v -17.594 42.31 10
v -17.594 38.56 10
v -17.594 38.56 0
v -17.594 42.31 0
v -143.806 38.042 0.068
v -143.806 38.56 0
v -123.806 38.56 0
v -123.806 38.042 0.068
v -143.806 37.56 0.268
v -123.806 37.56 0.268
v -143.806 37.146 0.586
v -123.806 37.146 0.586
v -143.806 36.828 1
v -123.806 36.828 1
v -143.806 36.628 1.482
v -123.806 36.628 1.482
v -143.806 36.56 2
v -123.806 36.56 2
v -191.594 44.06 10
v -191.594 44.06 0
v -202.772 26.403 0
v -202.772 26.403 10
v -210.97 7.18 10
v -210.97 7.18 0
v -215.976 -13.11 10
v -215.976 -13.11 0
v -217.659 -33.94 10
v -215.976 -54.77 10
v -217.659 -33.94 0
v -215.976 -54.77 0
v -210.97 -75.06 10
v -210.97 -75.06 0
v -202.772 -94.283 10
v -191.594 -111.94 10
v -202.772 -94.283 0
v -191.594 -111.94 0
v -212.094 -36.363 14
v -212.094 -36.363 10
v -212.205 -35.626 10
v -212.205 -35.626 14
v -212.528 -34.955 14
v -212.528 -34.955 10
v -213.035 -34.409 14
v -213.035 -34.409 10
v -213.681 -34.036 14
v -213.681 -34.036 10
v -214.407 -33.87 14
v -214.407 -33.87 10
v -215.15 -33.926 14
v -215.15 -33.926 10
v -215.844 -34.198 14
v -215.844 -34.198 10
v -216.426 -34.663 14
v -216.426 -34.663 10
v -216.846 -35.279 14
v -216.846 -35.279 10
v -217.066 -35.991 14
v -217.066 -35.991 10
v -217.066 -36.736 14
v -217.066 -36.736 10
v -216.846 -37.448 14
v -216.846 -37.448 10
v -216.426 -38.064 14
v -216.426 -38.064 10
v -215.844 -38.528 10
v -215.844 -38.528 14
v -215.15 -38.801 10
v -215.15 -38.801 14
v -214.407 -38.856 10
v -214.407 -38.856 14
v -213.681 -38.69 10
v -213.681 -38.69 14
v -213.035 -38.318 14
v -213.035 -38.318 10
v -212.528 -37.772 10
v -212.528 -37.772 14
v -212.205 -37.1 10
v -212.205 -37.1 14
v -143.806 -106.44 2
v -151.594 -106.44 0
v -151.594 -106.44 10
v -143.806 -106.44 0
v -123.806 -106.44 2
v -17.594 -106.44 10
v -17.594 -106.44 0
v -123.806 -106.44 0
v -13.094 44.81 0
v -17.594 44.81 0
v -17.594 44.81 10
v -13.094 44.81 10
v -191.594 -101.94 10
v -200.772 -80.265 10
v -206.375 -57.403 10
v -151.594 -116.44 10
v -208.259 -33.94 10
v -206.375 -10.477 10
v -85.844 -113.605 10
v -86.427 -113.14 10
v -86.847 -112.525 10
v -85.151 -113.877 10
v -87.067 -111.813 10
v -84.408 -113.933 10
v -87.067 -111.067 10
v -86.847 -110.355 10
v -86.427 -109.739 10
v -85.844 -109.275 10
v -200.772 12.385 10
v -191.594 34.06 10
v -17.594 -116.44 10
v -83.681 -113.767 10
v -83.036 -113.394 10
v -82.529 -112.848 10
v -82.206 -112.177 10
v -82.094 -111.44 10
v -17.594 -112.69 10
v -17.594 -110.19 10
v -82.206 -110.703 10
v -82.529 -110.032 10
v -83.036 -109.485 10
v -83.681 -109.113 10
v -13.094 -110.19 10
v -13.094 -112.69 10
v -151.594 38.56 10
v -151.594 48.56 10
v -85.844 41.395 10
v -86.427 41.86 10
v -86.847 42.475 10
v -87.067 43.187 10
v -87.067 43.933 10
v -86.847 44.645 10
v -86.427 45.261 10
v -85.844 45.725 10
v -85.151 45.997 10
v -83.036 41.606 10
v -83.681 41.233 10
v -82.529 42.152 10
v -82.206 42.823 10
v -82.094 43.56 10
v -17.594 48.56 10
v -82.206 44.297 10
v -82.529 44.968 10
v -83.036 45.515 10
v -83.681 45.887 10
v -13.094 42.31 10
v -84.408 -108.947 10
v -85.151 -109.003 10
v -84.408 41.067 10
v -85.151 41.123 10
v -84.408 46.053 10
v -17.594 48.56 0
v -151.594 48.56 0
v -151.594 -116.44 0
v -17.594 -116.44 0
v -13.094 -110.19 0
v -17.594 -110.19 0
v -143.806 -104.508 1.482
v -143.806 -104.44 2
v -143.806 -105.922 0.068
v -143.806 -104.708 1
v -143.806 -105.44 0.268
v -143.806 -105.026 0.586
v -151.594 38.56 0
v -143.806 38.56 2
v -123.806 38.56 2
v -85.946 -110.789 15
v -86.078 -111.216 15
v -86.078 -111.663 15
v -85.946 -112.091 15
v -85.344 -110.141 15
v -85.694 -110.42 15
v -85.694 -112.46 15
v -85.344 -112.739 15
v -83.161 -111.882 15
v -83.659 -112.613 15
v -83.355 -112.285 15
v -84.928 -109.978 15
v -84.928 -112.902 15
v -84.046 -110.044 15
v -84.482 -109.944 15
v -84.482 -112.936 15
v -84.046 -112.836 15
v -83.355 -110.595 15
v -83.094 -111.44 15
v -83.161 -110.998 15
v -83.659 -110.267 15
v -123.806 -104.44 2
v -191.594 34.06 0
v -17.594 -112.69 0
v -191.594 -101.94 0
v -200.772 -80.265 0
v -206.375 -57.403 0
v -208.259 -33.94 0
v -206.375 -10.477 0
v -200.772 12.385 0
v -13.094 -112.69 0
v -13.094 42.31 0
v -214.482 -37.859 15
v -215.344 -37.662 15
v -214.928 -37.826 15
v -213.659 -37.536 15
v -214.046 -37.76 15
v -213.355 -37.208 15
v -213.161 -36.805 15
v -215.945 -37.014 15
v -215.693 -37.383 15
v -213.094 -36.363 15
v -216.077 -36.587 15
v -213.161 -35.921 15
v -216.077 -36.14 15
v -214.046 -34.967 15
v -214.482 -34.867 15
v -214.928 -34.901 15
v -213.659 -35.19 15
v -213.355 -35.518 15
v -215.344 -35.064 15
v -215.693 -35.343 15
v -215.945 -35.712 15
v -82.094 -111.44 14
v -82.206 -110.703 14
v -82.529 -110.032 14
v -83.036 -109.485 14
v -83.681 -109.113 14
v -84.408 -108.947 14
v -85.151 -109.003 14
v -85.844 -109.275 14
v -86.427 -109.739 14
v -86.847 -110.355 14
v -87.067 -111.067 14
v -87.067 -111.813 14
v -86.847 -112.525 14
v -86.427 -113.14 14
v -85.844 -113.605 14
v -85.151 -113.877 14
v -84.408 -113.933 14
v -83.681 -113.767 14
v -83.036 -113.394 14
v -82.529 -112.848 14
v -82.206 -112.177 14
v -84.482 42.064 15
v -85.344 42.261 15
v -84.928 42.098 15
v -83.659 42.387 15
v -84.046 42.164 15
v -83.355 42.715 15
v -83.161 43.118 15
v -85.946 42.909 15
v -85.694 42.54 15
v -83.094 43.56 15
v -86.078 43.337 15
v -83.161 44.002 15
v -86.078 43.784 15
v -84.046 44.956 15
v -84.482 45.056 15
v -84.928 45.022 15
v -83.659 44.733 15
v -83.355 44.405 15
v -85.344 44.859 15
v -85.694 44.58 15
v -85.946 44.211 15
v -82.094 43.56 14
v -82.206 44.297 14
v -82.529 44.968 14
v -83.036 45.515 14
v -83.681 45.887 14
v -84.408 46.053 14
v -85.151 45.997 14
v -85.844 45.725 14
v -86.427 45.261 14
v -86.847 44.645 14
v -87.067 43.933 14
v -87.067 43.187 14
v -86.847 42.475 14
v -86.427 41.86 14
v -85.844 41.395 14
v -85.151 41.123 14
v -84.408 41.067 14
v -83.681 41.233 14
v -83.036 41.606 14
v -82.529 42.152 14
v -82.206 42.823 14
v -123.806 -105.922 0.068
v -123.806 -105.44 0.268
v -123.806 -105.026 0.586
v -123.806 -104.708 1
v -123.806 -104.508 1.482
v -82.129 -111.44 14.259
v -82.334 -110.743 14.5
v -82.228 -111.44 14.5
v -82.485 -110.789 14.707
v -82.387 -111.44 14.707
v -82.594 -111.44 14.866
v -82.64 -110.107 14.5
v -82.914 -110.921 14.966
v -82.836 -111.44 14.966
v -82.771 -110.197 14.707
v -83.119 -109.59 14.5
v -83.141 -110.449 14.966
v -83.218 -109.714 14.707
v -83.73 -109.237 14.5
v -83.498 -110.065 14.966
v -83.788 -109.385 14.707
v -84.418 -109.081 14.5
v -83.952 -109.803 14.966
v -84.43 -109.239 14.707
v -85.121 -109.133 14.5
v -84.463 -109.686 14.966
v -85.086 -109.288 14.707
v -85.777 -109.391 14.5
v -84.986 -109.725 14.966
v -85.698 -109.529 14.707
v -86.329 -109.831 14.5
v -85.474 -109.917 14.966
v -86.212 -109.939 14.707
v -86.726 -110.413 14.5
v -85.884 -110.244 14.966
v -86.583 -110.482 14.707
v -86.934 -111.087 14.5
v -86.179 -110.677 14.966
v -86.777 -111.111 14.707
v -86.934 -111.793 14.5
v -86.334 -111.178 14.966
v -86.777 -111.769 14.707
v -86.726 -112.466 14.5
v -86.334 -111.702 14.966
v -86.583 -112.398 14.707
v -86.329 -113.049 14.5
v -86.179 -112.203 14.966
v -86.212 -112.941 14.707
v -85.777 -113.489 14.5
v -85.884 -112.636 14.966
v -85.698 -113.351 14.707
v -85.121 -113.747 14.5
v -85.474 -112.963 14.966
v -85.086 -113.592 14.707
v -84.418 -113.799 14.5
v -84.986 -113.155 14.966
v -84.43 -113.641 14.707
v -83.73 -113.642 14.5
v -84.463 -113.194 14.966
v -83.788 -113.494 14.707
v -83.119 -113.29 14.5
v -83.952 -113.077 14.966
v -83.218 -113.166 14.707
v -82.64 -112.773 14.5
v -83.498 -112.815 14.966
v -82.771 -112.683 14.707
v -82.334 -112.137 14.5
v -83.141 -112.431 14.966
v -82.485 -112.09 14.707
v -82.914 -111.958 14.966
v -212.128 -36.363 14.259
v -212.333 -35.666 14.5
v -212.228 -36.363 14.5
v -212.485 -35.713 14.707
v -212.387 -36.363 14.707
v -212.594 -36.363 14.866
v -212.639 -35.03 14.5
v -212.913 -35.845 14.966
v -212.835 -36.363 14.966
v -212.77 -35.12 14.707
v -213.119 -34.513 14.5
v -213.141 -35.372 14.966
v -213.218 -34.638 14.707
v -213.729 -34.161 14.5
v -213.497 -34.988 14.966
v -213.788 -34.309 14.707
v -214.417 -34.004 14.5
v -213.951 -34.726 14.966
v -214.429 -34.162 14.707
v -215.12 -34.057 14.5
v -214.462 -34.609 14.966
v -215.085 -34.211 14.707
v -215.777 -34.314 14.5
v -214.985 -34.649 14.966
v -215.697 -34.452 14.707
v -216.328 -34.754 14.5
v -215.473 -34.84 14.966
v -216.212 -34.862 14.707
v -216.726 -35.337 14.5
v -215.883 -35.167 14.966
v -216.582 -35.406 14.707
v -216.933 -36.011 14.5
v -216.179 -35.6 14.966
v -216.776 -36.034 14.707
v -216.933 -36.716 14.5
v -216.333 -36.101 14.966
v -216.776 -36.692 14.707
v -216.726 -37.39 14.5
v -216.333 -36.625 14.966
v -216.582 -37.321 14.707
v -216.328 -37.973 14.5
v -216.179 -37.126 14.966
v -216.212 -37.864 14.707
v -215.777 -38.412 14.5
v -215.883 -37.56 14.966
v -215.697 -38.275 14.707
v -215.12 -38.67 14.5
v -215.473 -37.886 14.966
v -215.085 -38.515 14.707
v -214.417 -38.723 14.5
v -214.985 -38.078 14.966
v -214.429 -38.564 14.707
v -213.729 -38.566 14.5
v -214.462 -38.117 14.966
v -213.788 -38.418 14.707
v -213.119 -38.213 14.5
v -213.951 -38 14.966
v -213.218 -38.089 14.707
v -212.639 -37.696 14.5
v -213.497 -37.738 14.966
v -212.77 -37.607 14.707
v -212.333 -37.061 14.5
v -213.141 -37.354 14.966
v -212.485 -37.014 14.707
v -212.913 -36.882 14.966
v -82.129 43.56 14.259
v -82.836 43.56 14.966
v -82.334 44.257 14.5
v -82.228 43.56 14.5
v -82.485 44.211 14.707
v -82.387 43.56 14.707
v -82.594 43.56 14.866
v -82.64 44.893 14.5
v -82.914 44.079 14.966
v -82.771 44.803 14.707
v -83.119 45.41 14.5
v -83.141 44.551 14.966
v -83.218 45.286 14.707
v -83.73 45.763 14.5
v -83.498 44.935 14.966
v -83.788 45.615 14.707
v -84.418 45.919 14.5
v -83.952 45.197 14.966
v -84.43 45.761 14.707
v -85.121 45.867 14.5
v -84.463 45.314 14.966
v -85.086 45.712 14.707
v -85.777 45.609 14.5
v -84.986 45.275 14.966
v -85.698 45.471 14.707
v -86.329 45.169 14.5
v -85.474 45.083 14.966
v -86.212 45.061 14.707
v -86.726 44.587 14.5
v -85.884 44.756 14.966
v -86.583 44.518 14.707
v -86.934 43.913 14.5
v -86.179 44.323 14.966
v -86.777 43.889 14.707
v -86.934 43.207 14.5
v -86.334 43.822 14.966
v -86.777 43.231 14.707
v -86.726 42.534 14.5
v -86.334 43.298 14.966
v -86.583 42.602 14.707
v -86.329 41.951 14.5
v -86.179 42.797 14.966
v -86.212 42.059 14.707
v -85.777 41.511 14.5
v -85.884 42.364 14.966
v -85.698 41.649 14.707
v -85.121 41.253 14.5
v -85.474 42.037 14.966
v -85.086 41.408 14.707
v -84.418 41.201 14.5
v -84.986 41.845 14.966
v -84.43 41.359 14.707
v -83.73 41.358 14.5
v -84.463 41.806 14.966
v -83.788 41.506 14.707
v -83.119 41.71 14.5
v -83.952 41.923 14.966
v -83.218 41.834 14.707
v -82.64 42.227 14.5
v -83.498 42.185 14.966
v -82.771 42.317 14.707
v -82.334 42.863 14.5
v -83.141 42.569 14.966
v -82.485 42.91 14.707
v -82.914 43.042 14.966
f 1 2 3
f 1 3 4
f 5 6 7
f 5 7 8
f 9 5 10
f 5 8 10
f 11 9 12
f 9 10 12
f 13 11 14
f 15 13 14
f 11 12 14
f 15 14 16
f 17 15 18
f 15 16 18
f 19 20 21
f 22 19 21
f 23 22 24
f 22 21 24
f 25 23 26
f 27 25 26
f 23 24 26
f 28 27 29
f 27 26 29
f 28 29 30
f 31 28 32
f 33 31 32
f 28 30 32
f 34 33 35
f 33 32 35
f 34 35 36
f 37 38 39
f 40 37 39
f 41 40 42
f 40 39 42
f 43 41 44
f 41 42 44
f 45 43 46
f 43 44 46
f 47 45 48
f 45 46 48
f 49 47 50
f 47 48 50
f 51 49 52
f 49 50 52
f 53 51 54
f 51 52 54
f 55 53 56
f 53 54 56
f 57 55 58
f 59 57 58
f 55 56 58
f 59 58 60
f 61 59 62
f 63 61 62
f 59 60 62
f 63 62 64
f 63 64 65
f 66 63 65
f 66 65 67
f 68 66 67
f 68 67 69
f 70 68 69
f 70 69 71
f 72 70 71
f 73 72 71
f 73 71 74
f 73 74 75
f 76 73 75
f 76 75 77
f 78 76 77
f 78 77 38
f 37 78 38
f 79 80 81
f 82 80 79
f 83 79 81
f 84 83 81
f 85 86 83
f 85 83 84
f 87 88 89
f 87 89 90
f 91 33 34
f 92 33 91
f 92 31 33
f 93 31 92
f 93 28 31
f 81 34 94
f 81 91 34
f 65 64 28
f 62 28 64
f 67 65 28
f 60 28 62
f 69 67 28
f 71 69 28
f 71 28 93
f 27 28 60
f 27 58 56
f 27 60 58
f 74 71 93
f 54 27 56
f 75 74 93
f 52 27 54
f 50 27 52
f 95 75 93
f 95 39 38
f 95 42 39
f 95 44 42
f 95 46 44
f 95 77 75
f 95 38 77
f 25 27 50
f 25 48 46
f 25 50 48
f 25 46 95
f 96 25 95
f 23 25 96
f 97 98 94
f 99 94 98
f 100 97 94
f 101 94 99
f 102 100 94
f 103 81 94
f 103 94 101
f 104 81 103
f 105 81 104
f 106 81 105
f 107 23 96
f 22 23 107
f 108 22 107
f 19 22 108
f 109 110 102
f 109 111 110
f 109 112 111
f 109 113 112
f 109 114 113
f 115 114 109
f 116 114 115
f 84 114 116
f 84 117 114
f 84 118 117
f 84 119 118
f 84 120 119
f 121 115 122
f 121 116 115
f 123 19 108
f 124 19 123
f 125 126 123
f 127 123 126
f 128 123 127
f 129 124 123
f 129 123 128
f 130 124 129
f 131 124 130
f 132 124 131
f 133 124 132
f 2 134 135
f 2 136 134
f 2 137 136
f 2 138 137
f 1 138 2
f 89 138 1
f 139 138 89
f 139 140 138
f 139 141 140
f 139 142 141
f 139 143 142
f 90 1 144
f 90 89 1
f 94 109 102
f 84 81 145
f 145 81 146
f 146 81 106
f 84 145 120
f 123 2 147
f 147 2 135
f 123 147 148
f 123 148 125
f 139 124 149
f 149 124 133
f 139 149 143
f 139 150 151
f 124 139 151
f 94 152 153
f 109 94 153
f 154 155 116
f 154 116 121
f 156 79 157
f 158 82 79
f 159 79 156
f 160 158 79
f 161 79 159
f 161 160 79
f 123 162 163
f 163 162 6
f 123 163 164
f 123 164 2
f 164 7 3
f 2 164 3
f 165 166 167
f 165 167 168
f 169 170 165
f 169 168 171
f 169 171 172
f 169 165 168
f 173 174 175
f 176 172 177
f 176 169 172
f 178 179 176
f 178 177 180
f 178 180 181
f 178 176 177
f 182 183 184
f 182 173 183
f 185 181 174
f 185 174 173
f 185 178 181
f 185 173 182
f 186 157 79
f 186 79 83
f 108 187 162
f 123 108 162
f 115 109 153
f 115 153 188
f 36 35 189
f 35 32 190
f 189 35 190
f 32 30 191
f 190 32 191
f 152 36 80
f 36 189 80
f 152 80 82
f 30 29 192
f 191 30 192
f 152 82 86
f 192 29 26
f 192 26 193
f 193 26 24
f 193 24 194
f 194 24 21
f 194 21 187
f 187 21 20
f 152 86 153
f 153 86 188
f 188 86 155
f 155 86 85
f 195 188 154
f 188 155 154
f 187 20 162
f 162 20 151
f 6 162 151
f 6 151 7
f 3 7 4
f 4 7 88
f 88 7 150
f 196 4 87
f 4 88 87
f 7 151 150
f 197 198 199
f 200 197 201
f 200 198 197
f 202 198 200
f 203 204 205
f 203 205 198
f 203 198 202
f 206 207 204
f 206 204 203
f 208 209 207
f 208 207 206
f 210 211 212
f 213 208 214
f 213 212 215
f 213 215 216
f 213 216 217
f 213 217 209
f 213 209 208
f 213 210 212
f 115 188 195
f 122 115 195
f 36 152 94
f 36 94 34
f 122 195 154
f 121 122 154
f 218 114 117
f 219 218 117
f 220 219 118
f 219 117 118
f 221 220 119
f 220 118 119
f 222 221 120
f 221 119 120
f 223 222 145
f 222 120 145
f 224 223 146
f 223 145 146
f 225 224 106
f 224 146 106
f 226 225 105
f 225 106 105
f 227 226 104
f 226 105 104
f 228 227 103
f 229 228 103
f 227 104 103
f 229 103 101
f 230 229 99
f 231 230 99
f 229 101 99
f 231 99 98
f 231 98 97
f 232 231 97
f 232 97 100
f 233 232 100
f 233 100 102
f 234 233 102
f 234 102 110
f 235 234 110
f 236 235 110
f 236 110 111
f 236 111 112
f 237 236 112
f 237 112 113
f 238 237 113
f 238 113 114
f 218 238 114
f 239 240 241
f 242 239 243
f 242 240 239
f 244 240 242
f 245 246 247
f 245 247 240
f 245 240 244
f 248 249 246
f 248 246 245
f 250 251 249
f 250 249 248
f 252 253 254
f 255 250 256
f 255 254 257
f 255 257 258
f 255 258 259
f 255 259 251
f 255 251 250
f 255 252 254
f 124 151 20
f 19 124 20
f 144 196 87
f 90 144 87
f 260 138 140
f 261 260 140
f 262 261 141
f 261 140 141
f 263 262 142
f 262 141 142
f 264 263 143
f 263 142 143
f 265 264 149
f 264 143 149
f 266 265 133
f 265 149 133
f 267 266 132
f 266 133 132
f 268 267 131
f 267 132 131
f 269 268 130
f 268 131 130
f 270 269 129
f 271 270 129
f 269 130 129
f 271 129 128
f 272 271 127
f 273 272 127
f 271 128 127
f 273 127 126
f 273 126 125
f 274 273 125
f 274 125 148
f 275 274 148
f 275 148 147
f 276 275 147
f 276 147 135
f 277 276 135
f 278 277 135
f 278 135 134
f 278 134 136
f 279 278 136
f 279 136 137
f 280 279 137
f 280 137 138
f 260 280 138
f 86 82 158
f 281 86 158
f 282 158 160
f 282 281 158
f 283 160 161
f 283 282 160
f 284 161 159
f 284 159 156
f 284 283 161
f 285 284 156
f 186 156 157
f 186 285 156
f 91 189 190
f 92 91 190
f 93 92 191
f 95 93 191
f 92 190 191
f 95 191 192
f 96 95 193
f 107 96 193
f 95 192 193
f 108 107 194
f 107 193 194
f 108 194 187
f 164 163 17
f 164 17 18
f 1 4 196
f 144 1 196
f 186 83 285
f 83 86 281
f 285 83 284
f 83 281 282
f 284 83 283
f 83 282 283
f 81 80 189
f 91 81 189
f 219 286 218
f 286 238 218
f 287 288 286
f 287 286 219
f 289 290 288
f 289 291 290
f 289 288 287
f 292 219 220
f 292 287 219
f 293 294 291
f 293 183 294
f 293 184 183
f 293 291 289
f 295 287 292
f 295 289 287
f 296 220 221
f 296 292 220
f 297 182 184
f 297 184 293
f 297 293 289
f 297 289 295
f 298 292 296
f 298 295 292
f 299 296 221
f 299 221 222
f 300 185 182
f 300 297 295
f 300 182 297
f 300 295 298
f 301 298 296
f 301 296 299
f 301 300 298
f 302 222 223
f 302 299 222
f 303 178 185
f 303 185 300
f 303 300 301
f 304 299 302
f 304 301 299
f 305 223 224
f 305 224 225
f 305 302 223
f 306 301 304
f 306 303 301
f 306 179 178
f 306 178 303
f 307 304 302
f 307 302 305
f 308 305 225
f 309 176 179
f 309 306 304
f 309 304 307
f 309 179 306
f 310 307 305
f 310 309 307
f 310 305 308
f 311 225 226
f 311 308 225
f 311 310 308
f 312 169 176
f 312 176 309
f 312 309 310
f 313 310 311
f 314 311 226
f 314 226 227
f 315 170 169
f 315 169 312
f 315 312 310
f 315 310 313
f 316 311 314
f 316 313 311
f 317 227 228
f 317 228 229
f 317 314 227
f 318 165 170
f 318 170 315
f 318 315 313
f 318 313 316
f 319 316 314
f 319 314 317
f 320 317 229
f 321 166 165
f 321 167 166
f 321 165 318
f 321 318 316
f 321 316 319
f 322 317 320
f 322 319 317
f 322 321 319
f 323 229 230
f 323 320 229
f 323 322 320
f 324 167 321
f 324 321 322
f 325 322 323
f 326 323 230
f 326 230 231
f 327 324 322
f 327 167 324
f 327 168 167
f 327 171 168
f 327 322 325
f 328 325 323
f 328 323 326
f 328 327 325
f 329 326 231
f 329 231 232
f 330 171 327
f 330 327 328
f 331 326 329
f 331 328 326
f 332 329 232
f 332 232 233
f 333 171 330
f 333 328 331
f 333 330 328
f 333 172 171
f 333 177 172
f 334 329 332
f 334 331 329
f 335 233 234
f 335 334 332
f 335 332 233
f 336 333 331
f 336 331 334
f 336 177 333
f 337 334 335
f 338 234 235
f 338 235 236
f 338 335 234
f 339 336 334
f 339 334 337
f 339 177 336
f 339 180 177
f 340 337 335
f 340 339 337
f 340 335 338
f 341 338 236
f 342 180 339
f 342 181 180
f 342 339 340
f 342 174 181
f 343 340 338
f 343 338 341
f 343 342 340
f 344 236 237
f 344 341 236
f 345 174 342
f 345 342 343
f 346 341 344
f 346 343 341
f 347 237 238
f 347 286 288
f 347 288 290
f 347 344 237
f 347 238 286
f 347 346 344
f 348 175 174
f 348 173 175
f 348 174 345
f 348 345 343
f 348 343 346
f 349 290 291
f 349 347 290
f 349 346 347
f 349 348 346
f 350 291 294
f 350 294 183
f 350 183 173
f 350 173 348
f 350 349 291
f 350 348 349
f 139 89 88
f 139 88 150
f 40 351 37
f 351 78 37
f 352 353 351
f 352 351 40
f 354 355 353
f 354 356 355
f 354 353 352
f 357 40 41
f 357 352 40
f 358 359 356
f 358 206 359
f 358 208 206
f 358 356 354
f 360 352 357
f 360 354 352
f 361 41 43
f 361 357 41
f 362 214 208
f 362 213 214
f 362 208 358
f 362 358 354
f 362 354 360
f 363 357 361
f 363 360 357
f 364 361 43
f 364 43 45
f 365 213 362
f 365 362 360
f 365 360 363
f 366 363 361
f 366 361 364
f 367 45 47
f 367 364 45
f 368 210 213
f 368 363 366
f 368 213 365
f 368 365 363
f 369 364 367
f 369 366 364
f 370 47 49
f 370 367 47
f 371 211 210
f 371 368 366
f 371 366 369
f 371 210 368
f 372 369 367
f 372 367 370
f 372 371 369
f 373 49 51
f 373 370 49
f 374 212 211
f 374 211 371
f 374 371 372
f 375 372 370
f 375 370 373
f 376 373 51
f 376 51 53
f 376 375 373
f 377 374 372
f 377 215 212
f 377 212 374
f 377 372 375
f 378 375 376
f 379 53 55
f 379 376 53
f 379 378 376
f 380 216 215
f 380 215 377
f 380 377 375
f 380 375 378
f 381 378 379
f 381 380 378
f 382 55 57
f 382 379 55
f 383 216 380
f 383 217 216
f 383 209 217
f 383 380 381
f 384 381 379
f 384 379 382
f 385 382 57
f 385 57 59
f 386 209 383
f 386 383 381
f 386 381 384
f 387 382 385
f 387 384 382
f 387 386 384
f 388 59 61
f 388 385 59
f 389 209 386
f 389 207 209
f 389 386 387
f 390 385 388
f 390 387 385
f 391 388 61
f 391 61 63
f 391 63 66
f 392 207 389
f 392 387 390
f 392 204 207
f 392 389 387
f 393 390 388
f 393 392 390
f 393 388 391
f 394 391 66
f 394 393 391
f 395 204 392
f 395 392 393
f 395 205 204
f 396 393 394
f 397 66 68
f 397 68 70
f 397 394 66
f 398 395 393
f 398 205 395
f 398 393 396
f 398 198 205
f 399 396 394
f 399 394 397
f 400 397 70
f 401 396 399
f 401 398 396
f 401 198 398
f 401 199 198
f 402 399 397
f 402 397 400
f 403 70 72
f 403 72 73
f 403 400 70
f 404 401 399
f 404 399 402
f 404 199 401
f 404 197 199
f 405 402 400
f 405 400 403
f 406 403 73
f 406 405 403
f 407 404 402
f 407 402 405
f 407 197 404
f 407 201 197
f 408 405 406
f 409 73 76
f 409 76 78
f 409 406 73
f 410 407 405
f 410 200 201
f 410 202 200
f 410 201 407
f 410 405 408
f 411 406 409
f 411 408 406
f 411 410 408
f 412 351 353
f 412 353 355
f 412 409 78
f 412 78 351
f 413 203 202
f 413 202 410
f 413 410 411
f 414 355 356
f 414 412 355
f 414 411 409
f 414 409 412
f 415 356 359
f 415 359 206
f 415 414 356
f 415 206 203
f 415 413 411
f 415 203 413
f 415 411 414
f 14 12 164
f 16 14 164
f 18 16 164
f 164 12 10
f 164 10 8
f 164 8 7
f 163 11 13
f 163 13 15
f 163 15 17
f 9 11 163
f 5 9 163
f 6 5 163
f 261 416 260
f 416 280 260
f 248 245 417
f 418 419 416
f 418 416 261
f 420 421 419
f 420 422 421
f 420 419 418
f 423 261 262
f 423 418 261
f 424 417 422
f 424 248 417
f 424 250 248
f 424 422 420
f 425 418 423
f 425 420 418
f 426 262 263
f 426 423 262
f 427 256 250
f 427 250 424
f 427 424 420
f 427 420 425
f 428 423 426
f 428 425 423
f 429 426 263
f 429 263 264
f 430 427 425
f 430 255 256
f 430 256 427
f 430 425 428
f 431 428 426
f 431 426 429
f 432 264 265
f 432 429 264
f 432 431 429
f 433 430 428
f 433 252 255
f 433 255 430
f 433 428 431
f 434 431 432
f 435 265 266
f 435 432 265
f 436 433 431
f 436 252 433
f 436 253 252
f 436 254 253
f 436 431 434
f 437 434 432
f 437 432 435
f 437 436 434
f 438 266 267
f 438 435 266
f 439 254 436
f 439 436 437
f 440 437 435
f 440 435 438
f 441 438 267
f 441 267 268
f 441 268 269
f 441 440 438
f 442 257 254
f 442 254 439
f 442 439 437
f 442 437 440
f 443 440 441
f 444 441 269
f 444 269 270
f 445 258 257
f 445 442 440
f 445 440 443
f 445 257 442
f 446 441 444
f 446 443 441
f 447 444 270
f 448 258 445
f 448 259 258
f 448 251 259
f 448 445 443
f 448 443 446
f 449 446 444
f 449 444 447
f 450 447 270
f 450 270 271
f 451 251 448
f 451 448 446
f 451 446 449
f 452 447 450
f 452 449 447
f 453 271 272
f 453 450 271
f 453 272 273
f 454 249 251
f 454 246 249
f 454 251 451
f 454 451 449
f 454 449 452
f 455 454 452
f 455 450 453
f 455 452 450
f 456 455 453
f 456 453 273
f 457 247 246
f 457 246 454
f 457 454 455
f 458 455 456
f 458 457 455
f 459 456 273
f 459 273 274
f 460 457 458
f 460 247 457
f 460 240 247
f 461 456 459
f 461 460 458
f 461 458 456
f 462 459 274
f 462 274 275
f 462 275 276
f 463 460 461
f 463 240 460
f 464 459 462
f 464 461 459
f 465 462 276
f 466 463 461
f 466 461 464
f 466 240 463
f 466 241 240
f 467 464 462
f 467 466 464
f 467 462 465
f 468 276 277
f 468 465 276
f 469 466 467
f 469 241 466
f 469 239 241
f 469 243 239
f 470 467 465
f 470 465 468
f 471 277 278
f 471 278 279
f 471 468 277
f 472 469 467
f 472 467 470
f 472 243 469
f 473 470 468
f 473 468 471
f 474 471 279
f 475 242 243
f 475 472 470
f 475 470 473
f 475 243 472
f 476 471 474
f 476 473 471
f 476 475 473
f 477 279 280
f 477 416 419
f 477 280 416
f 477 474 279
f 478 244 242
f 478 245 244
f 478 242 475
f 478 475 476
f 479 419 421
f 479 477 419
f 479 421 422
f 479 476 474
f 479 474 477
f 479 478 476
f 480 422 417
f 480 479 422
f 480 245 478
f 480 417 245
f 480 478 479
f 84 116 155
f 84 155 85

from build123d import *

# Parameters (mm, degrees)
ESQUISSE1_R        = 2.5
ESQUISSE1_W        = 134
ESQUISSE1_H        = 10
BOSS_EXTRU_2_DEPTH = 10
ESQUISSE1_26_W     = 20
ESQUISSE1_26_H     = 2
BOSS_EXTRU_3_DEPTH = 2
ESQUISSE1_27_R     = 2.5
BOSS_EXTRU_4_DEPTH = 15
ESQUISSE1_28_W     = 4.5
ESQUISSE1_28_H     = 2.5
BOSS_EXTRU_5_DEPTH = 10
CONG_1_R           = 1
CONG_2_R           = 1
CONG_3_R           = 1
CONG_4_R           = 2
CONG_5_R           = 2


with BuildPart() as part:
    # Esquisse1 → Boss.-Extru.2 (new body)
    # profile 1 of 7: a face of its own
    with BuildSketch(Plane.XY):
        Polygon((-151.59444934, 48.560080763), (-151.59444934, 38.560080763), (-143.805852374, 38.560080763), (-123.805852374, 38.560080763), (-17.59444934, 38.560080763), (-17.59444934, 42.310080763), (-17.59444934, 44.810080763), (-17.59444934, 48.560080763), align=None)
        with Locations((-84.59444934, 43.560080763)):
            Circle(ESQUISSE1_R, mode=Mode.SUBTRACT)
    # profile 2 of 7: a face of its own
    with BuildSketch(Plane.XY):
        Polygon((-191.59444934, 38.560080763), (-151.59444934, 38.560080763), (-151.59444934, 48.560080763), (-191.59444934, 44.060080763), align=None)
    # profile 3 of 7: a face of its own
    with BuildSketch(Plane.XY):
        with BuildLine():
            ThreePointArc((-191.59444934, -101.939919237), (-208.258682651, -33.939919237), (-191.59444934, 34.060080763))
            Line((-191.59444934, 34.060080763), (-191.59444934, 38.560080763))
            Line((-191.59444934, 38.560080763), (-191.59444934, 44.060080763))
            ThreePointArc((-191.59444934, 44.060080763), (-217.658663565, -33.939919237), (-191.59444934, -111.939919237))
            Line((-191.59444934, -111.939919237), (-191.59444934, -106.439919237))
            Line((-191.59444934, -106.439919237), (-191.59444934, -101.939919237))
        make_face()
        with Locations((-214.593861295, -36.363237388)):
            Circle(ESQUISSE1_R, mode=Mode.SUBTRACT)
    # profile 4 of 7: a face of its own
    with BuildSketch(Plane.XY):
        Polygon((-191.59444934, 38.560080763), (-191.59444934, 34.060080763), (-151.59444934, 38.560080763), align=None)
    # profile 5 of 7: a face of its own
    with BuildSketch(Plane.XY):
        Polygon((-191.59444934, -111.939919237), (-191.59444934, -106.439919237), (-151.59444934, -106.439919237), (-151.59444934, -116.439919237), align=None)
    # profile 6 of 7: a face of its own
    with BuildSketch(Plane.XY):
        Polygon((-151.59444934, -106.439919237), (-191.59444934, -101.939919237), (-191.59444934, -106.439919237), align=None)
    # profile 7 of 7: a face of its own
    with BuildSketch(Plane.XY):
        with Locations((-84.59444934, -111.439919237)):
            Rectangle(ESQUISSE1_W, ESQUISSE1_H)
        with Locations((-84.59444934, -111.439919237)):
            Circle(ESQUISSE1_R, mode=Mode.SUBTRACT)
    extrude(amount=BOSS_EXTRU_2_DEPTH)

    # Esquisse1<26> → Boss.-Extru.3 (add)
    with BuildSketch(Plane.XY):
        with Locations((-133.805852374, -105.439919237)):
            Rectangle(ESQUISSE1_26_W, ESQUISSE1_26_H)
        with Locations((-133.805852374, 37.560080763)):
            Rectangle(ESQUISSE1_26_W, ESQUISSE1_26_H)
    extrude(amount=BOSS_EXTRU_3_DEPTH)

    # Esquisse1<27> → Boss.-Extru.4 (add)
    with BuildSketch(Plane.XY):
        with Locations((-214.593861295, -36.363237388)):
            Circle(ESQUISSE1_27_R)
        with Locations((-84.59444934, 43.560080763)):
            Circle(ESQUISSE1_27_R)
        with Locations((-84.59444934, -111.439919237)):
            Circle(ESQUISSE1_27_R)
    extrude(amount=BOSS_EXTRU_4_DEPTH)

    # Esquisse1<28> → Boss.-Extru.5 (add)
    with BuildSketch(Plane.XY):
        with Locations((-15.34444934, 43.560080763)):
            Rectangle(ESQUISSE1_28_W, ESQUISSE1_28_H)
        with Locations((-15.34444934, -111.439919237)):
            Rectangle(ESQUISSE1_28_W, ESQUISSE1_28_H)
    extrude(amount=BOSS_EXTRU_5_DEPTH)

    # Congé1
    cong_1_edges = [part.edges().sort_by_distance(p)[0] for p in [
        (-87.09444934, 43.560080763, 15),
    ]]
    fillet(cong_1_edges, radius=CONG_1_R)

    # Congé2
    cong_2_edges = [part.edges().sort_by_distance(p)[0] for p in [
        (-87.09444934, -111.439919237, 15),
    ]]
    fillet(cong_2_edges, radius=CONG_2_R)

    # Congé3
    cong_3_edges = [part.edges().sort_by_distance(p)[0] for p in [
        (-217.093861295, -36.363237388, 15),
    ]]
    fillet(cong_3_edges, radius=CONG_3_R)

    # Congé4
    cong_4_edges = [part.edges().sort_by_distance(p)[0] for p in [
        (-133.805852374, -104.439919237, 0),
    ]]
    fillet(cong_4_edges, radius=CONG_4_R - 0.0001)  # a hair under: the kernel refuses the full size

    # Congé5
    cong_5_edges = [part.edges().sort_by_distance(p)[0] for p in [
        (-133.805852374, 36.560080763, 0),
    ]]
    fillet(cong_5_edges, radius=CONG_5_R - 0.0001)  # a hair under: the kernel refuses the full size


solid = part.part
